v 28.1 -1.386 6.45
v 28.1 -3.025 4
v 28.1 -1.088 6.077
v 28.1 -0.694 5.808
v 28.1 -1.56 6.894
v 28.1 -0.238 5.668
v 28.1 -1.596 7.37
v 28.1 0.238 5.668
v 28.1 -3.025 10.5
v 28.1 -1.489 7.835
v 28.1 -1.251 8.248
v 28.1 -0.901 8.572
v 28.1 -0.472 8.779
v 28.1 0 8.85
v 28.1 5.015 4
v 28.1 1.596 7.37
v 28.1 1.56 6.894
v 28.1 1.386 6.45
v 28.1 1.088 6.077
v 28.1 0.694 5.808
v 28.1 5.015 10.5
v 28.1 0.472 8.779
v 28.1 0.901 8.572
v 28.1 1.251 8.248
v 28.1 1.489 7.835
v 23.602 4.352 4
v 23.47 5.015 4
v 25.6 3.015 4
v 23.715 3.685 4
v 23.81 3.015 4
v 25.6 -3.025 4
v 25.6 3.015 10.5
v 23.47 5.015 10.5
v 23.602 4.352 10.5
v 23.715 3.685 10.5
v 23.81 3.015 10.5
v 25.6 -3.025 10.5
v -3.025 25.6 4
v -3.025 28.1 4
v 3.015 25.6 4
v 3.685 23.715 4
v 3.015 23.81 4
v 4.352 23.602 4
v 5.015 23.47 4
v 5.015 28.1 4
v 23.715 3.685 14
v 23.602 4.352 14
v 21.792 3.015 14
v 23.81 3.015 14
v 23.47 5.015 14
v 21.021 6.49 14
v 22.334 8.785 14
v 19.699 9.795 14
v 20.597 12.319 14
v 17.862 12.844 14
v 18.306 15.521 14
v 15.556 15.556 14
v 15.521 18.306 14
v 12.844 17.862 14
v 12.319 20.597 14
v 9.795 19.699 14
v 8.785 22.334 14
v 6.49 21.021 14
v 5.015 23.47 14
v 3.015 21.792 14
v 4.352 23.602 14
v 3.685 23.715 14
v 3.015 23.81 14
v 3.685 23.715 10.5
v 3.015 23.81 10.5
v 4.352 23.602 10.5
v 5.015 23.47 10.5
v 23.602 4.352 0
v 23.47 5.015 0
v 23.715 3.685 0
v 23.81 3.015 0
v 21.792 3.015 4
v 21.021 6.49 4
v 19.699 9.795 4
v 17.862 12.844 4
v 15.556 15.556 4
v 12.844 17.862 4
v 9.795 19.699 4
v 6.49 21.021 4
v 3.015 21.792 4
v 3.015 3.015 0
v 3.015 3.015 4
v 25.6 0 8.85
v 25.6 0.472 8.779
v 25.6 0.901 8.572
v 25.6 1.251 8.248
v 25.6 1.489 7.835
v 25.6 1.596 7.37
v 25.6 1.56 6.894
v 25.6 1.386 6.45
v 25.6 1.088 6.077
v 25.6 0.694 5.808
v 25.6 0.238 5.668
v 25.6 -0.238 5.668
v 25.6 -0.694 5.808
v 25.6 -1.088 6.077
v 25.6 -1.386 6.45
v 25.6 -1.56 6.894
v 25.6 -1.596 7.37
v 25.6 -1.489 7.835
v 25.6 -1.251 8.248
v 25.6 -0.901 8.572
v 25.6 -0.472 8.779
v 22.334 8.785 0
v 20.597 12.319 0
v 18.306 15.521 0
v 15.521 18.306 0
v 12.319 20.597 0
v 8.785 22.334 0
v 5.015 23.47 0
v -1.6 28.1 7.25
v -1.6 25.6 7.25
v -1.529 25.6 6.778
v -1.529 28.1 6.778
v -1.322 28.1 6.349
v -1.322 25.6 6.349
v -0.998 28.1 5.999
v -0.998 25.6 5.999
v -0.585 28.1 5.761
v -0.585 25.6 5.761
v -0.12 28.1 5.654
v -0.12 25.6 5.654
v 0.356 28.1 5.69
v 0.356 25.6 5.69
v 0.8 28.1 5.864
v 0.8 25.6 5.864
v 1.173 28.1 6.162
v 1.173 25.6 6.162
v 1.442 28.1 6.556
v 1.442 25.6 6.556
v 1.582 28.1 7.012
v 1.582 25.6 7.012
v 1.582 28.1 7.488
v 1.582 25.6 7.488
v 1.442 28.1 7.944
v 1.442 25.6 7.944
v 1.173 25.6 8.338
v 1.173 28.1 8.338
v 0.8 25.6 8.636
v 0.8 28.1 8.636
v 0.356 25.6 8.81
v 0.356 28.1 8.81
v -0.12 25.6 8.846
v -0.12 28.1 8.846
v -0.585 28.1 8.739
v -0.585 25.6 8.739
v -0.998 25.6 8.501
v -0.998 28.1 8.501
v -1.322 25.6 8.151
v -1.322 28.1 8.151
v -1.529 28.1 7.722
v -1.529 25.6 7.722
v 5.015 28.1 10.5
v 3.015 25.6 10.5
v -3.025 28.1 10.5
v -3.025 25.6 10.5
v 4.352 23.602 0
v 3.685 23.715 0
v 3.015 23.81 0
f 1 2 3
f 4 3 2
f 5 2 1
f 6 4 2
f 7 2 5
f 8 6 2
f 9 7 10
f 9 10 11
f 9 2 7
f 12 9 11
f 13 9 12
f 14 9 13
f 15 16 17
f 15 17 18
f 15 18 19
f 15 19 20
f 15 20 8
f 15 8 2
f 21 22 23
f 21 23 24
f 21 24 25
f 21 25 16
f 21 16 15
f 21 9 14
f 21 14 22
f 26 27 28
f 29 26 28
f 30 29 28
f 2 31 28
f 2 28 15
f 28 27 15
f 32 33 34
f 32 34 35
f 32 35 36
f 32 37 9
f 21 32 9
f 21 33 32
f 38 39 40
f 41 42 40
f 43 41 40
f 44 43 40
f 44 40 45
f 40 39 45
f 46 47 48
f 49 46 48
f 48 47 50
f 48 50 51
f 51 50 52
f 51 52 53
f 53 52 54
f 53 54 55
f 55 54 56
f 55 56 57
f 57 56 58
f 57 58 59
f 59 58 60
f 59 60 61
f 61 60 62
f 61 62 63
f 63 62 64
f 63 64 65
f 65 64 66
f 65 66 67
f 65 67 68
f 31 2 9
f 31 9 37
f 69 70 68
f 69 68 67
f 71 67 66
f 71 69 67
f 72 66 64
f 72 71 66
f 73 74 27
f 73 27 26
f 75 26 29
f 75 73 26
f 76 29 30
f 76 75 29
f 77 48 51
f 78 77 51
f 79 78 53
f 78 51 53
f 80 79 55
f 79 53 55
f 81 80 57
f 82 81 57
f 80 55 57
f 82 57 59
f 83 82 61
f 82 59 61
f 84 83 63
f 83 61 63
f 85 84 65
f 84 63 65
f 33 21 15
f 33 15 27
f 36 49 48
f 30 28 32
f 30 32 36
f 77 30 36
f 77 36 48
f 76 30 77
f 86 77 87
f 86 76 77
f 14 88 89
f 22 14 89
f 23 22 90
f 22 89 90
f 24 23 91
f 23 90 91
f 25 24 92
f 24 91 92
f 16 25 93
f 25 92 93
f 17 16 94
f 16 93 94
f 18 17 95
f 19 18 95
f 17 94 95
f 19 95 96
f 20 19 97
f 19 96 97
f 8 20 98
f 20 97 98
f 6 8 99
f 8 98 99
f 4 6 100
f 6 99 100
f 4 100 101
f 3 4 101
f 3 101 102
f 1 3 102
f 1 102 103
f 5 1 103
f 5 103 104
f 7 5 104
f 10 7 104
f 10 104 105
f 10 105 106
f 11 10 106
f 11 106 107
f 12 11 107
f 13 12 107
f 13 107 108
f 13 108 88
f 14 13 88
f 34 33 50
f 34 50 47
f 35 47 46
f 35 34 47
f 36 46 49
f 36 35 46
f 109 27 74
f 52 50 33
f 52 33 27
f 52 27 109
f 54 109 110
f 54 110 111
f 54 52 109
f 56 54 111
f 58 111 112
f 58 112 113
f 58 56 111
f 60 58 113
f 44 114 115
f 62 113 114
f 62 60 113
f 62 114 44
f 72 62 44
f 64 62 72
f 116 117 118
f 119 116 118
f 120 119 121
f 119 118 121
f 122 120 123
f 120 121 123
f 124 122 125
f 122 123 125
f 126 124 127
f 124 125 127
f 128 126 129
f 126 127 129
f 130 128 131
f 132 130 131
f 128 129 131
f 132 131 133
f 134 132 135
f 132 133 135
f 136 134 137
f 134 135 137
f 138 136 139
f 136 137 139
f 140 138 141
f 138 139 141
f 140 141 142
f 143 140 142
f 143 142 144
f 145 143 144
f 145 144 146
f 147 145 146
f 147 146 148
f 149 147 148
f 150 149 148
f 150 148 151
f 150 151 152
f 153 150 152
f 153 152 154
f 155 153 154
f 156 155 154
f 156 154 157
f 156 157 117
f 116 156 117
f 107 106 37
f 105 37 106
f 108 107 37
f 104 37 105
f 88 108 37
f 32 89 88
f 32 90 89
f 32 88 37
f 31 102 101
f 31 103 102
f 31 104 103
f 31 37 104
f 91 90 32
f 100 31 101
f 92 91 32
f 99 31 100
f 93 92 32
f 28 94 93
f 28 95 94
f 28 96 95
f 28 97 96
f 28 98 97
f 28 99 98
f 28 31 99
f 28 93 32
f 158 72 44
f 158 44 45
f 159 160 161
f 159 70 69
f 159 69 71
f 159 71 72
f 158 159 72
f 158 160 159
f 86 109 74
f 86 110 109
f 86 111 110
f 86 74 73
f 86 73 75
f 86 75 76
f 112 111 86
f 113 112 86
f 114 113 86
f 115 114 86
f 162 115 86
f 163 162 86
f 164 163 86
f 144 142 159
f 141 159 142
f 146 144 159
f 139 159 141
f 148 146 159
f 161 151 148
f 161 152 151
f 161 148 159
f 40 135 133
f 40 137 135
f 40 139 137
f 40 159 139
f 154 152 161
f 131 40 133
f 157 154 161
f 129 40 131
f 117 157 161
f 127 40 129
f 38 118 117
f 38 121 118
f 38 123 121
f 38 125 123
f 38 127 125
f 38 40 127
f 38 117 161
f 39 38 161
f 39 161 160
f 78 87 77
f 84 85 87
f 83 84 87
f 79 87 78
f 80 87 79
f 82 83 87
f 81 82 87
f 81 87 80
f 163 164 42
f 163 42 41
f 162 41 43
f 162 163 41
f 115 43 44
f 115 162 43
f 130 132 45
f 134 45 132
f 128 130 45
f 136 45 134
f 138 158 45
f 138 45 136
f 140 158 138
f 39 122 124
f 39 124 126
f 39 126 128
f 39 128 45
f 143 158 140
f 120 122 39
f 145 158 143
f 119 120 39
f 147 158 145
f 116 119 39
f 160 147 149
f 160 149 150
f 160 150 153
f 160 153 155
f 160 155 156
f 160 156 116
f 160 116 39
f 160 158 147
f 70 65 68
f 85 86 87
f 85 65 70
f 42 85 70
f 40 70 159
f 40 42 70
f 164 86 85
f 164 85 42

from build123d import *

# Parameters (mm, degrees)
BOSS_EXTRUDE1_DEPTH   = 14.5
M3_CLEARANCE_HOLE1_D  = 3.2
M3_CLEARANCE_HOLE2_D  = 3.2
SKETCH6_W             = 6.05
SKETCH6_H             = 4
CUT_EXTRUDE1_DEPTH    = 10
SKETCH7_W             = 4
SKETCH7_H             = 6.05
CUT_EXTRUDE2_DEPTH    = 10
BOSS_EXTRUDE7_DEPTH   = 14
SKETCH14_W            = 57.002666796
SKETCH14_H            = 41.192482136
CUT_EXTRUDE4_DEPTH    = 15
CUT_EXTRUDE5_DEPTH    = 10
CUT_EXTRUDE8_DEPTH    = 20
CUT_EXTRUDE9_DEPTH    = 4
CUT_EXTRUDE9_START    = 10.5
CUT_EXTRUDE9_2_DEPTH  = 3.5
CUT_EXTRUDE10_DEPTH   = 4
CUT_EXTRUDE10_START   = 10.5
CUT_EXTRUDE10_2_DEPTH = 3.5


# Read off the part's stored shape, not the designer's step: Cut-Extrude9, Cut-Extrude10
with BuildPart() as part:
    # Sketch1 → Boss-Extrude1 (new body)
    with BuildSketch(Plane.XY):
        with BuildLine():
            Line((3.025, 25.6), (-3.025, 25.6))
            Line((-3.025, 25.6), (-3.025, 28.1))
            Line((-3.025, 28.1), (3.025, 28.1))
            ThreePointArc((3.025, 28.1), (21.312111091, 21.312111091), (28.1, 3.025))
            Line((28.1, 3.025), (28.1, -3.025))
            Line((28.1, -3.025), (25.6, -3.025))
            Line((25.6, -3.025), (25.6, 3.025))
            ThreePointArc((25.6, 3.025), (18.987935585, 18.987935585), (3.025, 25.6))
        make_face()
    extrude(amount=BOSS_EXTRUDE1_DEPTH)

    # M3 Clearance Hole1 (through all)
    with Locations(Plane(origin=(0, 28.1, 0), x_dir=(1, 0, 0), z_dir=(0, 1, 0))):
        with Locations((0, -7.25)):
            Hole(M3_CLEARANCE_HOLE1_D / 2)

    # M3 Clearance Hole2 (through all)
    with Locations(Plane(origin=(28.1, 0, 0), x_dir=(0, 0, -1), z_dir=(1, 0, 0))):
        with Locations((-7.25, 0)):
            Hole(M3_CLEARANCE_HOLE2_D / 2)

    # Sketch6 → Cut-Extrude1 (cut)
    with BuildSketch(Plane(origin=(0, 28.1, 0), x_dir=(1, 0, 0), z_dir=(0, 1, 0))):
        with Locations((0, -12.5)):
            Rectangle(SKETCH6_W, SKETCH6_H)
        with Locations((0, -2)):
            Rectangle(SKETCH6_W, SKETCH6_H)
    extrude(amount=-CUT_EXTRUDE1_DEPTH, mode=Mode.SUBTRACT)

    # Sketch7 → Cut-Extrude2 (cut)
    with BuildSketch(Plane(origin=(28.1, 0, 0), x_dir=(0, 0, -1), z_dir=(1, 0, 0))):
        with Locations((-12.5, 0)):
            Rectangle(SKETCH7_W, SKETCH7_H)
        with Locations((-2, 0)):
            Rectangle(SKETCH7_W, SKETCH7_H)
    extrude(amount=-CUT_EXTRUDE2_DEPTH, mode=Mode.SUBTRACT)

    # Sketch8 → Boss-Extrude7 (add)
    with BuildSketch(Plane(origin=(0, 0, 0), x_dir=(-1, 0, 0), z_dir=(0, 0, -1))):
        with BuildLine():
            Line((-31.03541973, 3.015), (-3.015, 3.015))
            Line((-3.015, 3.015), (-3.015, 31.03541973))
            ThreePointArc((-3.015, 31.03541973), (-22.048667792, 22.048667792), (-31.03541973, 3.015))
        make_face()
    extrude(amount=-BOSS_EXTRUDE7_DEPTH)

    # Sketch14 → Cut-Extrude4 (cut)
    with BuildSketch(Plane.XY.offset(14)):
        with Locations((13.446699297, 19.415661607)):
            Rectangle(SKETCH14_W, SKETCH14_H)
    extrude(amount=CUT_EXTRUDE4_DEPTH, mode=Mode.SUBTRACT)

    # Sketch15 → Cut-Extrude5 (cut)
    with BuildSketch(Plane.XY.offset(14)):
        with BuildLine():
            Line((3.015, 21.792424716), (3.015, 3.015))
            Line((3.015, 3.015), (21.792424716, 3.015))
            ThreePointArc((21.792424716, 3.015), (15.556349186, 15.556349186), (3.015, 21.792424716))
        make_face()
    extrude(amount=-CUT_EXTRUDE5_DEPTH, mode=Mode.SUBTRACT)

    # Sketch16 → Cut-Extrude8 (cut)
    with BuildSketch(Plane.XY.offset(14)):
        with BuildLine():
            Line((5.015, 23.47018907), (5.015, 28.1))
            Line((5.015, 28.1), (3.015, 28.1))
            Line((3.015, 28.1), (3.015, 36.20716296))
            Line((3.015, 36.20716296), (34.30048071, 28.1))
            Line((34.30048071, 28.1), (32.410436515, 3.015))
            Line((32.410436515, 3.015), (28.1, 3.015))
            Line((28.1, 3.015), (28.1, 5.015))
            Line((28.1, 5.015), (23.47018907, 5.015))
            ThreePointArc((23.47018907, 5.015), (16.970562748, 16.970562748), (5.015, 23.47018907))
        make_face()
    extrude(amount=-CUT_EXTRUDE8_DEPTH, mode=Mode.SUBTRACT)

    # Cut-Extrude9 outline → Cut-Extrude9 (cut)
    with BuildSketch(Plane.XY):
        with BuildLine():
            Line((28.1, 3.015), (28.1, 5.015))
            Line((28.1, 5.015), (23.47018907, 5.015))
            ThreePointArc((23.47018907, 5.015), (23.661169237, 4.018590587), (23.809867177, 3.015))
            Line((23.809867177, 3.015), (28.1, 3.015))
        make_face()
    extrude(amount=CUT_EXTRUDE9_DEPTH, mode=Mode.SUBTRACT)

    # Cut-Extrude9 2 outline → Cut-Extrude9 2 (cut)
    with BuildSketch(Plane.XY.offset(CUT_EXTRUDE9_START)):
        with BuildLine():
            Line((28.1, 3.015), (28.1, 5.015))
            Line((28.1, 5.015), (23.47018907, 5.015))
            ThreePointArc((23.47018907, 5.015), (23.661169237, 4.018590587), (23.809867177, 3.015))
            Line((23.809867177, 3.015), (28.1, 3.015))
        make_face()
    extrude(amount=CUT_EXTRUDE9_2_DEPTH, mode=Mode.SUBTRACT)

    # Cut-Extrude10 outline → Cut-Extrude10 (cut)
    with BuildSketch(Plane.XY):
        with BuildLine():
            Line((5.015, 28.1), (3.015, 28.1))
            Line((3.015, 28.1), (3.015, 23.809867177))
            ThreePointArc((3.015, 23.809867177), (4.018590587, 23.661169237), (5.015, 23.47018907))
            Line((5.015, 23.47018907), (5.015, 28.1))
        make_face()
    extrude(amount=CUT_EXTRUDE10_DEPTH, mode=Mode.SUBTRACT)

    # Cut-Extrude10 2 outline → Cut-Extrude10 2 (cut)
    with BuildSketch(Plane.XY.offset(CUT_EXTRUDE10_START)):
        with BuildLine():
            Line((5.015, 28.1), (3.015, 28.1))
            Line((3.015, 28.1), (3.015, 23.809867177))
            ThreePointArc((3.015, 23.809867177), (4.018590587, 23.661169237), (5.015, 23.47018907))
            Line((5.015, 23.47018907), (5.015, 28.1))
        make_face()
    extrude(amount=CUT_EXTRUDE10_2_DEPTH, mode=Mode.SUBTRACT)


solid = part.part
